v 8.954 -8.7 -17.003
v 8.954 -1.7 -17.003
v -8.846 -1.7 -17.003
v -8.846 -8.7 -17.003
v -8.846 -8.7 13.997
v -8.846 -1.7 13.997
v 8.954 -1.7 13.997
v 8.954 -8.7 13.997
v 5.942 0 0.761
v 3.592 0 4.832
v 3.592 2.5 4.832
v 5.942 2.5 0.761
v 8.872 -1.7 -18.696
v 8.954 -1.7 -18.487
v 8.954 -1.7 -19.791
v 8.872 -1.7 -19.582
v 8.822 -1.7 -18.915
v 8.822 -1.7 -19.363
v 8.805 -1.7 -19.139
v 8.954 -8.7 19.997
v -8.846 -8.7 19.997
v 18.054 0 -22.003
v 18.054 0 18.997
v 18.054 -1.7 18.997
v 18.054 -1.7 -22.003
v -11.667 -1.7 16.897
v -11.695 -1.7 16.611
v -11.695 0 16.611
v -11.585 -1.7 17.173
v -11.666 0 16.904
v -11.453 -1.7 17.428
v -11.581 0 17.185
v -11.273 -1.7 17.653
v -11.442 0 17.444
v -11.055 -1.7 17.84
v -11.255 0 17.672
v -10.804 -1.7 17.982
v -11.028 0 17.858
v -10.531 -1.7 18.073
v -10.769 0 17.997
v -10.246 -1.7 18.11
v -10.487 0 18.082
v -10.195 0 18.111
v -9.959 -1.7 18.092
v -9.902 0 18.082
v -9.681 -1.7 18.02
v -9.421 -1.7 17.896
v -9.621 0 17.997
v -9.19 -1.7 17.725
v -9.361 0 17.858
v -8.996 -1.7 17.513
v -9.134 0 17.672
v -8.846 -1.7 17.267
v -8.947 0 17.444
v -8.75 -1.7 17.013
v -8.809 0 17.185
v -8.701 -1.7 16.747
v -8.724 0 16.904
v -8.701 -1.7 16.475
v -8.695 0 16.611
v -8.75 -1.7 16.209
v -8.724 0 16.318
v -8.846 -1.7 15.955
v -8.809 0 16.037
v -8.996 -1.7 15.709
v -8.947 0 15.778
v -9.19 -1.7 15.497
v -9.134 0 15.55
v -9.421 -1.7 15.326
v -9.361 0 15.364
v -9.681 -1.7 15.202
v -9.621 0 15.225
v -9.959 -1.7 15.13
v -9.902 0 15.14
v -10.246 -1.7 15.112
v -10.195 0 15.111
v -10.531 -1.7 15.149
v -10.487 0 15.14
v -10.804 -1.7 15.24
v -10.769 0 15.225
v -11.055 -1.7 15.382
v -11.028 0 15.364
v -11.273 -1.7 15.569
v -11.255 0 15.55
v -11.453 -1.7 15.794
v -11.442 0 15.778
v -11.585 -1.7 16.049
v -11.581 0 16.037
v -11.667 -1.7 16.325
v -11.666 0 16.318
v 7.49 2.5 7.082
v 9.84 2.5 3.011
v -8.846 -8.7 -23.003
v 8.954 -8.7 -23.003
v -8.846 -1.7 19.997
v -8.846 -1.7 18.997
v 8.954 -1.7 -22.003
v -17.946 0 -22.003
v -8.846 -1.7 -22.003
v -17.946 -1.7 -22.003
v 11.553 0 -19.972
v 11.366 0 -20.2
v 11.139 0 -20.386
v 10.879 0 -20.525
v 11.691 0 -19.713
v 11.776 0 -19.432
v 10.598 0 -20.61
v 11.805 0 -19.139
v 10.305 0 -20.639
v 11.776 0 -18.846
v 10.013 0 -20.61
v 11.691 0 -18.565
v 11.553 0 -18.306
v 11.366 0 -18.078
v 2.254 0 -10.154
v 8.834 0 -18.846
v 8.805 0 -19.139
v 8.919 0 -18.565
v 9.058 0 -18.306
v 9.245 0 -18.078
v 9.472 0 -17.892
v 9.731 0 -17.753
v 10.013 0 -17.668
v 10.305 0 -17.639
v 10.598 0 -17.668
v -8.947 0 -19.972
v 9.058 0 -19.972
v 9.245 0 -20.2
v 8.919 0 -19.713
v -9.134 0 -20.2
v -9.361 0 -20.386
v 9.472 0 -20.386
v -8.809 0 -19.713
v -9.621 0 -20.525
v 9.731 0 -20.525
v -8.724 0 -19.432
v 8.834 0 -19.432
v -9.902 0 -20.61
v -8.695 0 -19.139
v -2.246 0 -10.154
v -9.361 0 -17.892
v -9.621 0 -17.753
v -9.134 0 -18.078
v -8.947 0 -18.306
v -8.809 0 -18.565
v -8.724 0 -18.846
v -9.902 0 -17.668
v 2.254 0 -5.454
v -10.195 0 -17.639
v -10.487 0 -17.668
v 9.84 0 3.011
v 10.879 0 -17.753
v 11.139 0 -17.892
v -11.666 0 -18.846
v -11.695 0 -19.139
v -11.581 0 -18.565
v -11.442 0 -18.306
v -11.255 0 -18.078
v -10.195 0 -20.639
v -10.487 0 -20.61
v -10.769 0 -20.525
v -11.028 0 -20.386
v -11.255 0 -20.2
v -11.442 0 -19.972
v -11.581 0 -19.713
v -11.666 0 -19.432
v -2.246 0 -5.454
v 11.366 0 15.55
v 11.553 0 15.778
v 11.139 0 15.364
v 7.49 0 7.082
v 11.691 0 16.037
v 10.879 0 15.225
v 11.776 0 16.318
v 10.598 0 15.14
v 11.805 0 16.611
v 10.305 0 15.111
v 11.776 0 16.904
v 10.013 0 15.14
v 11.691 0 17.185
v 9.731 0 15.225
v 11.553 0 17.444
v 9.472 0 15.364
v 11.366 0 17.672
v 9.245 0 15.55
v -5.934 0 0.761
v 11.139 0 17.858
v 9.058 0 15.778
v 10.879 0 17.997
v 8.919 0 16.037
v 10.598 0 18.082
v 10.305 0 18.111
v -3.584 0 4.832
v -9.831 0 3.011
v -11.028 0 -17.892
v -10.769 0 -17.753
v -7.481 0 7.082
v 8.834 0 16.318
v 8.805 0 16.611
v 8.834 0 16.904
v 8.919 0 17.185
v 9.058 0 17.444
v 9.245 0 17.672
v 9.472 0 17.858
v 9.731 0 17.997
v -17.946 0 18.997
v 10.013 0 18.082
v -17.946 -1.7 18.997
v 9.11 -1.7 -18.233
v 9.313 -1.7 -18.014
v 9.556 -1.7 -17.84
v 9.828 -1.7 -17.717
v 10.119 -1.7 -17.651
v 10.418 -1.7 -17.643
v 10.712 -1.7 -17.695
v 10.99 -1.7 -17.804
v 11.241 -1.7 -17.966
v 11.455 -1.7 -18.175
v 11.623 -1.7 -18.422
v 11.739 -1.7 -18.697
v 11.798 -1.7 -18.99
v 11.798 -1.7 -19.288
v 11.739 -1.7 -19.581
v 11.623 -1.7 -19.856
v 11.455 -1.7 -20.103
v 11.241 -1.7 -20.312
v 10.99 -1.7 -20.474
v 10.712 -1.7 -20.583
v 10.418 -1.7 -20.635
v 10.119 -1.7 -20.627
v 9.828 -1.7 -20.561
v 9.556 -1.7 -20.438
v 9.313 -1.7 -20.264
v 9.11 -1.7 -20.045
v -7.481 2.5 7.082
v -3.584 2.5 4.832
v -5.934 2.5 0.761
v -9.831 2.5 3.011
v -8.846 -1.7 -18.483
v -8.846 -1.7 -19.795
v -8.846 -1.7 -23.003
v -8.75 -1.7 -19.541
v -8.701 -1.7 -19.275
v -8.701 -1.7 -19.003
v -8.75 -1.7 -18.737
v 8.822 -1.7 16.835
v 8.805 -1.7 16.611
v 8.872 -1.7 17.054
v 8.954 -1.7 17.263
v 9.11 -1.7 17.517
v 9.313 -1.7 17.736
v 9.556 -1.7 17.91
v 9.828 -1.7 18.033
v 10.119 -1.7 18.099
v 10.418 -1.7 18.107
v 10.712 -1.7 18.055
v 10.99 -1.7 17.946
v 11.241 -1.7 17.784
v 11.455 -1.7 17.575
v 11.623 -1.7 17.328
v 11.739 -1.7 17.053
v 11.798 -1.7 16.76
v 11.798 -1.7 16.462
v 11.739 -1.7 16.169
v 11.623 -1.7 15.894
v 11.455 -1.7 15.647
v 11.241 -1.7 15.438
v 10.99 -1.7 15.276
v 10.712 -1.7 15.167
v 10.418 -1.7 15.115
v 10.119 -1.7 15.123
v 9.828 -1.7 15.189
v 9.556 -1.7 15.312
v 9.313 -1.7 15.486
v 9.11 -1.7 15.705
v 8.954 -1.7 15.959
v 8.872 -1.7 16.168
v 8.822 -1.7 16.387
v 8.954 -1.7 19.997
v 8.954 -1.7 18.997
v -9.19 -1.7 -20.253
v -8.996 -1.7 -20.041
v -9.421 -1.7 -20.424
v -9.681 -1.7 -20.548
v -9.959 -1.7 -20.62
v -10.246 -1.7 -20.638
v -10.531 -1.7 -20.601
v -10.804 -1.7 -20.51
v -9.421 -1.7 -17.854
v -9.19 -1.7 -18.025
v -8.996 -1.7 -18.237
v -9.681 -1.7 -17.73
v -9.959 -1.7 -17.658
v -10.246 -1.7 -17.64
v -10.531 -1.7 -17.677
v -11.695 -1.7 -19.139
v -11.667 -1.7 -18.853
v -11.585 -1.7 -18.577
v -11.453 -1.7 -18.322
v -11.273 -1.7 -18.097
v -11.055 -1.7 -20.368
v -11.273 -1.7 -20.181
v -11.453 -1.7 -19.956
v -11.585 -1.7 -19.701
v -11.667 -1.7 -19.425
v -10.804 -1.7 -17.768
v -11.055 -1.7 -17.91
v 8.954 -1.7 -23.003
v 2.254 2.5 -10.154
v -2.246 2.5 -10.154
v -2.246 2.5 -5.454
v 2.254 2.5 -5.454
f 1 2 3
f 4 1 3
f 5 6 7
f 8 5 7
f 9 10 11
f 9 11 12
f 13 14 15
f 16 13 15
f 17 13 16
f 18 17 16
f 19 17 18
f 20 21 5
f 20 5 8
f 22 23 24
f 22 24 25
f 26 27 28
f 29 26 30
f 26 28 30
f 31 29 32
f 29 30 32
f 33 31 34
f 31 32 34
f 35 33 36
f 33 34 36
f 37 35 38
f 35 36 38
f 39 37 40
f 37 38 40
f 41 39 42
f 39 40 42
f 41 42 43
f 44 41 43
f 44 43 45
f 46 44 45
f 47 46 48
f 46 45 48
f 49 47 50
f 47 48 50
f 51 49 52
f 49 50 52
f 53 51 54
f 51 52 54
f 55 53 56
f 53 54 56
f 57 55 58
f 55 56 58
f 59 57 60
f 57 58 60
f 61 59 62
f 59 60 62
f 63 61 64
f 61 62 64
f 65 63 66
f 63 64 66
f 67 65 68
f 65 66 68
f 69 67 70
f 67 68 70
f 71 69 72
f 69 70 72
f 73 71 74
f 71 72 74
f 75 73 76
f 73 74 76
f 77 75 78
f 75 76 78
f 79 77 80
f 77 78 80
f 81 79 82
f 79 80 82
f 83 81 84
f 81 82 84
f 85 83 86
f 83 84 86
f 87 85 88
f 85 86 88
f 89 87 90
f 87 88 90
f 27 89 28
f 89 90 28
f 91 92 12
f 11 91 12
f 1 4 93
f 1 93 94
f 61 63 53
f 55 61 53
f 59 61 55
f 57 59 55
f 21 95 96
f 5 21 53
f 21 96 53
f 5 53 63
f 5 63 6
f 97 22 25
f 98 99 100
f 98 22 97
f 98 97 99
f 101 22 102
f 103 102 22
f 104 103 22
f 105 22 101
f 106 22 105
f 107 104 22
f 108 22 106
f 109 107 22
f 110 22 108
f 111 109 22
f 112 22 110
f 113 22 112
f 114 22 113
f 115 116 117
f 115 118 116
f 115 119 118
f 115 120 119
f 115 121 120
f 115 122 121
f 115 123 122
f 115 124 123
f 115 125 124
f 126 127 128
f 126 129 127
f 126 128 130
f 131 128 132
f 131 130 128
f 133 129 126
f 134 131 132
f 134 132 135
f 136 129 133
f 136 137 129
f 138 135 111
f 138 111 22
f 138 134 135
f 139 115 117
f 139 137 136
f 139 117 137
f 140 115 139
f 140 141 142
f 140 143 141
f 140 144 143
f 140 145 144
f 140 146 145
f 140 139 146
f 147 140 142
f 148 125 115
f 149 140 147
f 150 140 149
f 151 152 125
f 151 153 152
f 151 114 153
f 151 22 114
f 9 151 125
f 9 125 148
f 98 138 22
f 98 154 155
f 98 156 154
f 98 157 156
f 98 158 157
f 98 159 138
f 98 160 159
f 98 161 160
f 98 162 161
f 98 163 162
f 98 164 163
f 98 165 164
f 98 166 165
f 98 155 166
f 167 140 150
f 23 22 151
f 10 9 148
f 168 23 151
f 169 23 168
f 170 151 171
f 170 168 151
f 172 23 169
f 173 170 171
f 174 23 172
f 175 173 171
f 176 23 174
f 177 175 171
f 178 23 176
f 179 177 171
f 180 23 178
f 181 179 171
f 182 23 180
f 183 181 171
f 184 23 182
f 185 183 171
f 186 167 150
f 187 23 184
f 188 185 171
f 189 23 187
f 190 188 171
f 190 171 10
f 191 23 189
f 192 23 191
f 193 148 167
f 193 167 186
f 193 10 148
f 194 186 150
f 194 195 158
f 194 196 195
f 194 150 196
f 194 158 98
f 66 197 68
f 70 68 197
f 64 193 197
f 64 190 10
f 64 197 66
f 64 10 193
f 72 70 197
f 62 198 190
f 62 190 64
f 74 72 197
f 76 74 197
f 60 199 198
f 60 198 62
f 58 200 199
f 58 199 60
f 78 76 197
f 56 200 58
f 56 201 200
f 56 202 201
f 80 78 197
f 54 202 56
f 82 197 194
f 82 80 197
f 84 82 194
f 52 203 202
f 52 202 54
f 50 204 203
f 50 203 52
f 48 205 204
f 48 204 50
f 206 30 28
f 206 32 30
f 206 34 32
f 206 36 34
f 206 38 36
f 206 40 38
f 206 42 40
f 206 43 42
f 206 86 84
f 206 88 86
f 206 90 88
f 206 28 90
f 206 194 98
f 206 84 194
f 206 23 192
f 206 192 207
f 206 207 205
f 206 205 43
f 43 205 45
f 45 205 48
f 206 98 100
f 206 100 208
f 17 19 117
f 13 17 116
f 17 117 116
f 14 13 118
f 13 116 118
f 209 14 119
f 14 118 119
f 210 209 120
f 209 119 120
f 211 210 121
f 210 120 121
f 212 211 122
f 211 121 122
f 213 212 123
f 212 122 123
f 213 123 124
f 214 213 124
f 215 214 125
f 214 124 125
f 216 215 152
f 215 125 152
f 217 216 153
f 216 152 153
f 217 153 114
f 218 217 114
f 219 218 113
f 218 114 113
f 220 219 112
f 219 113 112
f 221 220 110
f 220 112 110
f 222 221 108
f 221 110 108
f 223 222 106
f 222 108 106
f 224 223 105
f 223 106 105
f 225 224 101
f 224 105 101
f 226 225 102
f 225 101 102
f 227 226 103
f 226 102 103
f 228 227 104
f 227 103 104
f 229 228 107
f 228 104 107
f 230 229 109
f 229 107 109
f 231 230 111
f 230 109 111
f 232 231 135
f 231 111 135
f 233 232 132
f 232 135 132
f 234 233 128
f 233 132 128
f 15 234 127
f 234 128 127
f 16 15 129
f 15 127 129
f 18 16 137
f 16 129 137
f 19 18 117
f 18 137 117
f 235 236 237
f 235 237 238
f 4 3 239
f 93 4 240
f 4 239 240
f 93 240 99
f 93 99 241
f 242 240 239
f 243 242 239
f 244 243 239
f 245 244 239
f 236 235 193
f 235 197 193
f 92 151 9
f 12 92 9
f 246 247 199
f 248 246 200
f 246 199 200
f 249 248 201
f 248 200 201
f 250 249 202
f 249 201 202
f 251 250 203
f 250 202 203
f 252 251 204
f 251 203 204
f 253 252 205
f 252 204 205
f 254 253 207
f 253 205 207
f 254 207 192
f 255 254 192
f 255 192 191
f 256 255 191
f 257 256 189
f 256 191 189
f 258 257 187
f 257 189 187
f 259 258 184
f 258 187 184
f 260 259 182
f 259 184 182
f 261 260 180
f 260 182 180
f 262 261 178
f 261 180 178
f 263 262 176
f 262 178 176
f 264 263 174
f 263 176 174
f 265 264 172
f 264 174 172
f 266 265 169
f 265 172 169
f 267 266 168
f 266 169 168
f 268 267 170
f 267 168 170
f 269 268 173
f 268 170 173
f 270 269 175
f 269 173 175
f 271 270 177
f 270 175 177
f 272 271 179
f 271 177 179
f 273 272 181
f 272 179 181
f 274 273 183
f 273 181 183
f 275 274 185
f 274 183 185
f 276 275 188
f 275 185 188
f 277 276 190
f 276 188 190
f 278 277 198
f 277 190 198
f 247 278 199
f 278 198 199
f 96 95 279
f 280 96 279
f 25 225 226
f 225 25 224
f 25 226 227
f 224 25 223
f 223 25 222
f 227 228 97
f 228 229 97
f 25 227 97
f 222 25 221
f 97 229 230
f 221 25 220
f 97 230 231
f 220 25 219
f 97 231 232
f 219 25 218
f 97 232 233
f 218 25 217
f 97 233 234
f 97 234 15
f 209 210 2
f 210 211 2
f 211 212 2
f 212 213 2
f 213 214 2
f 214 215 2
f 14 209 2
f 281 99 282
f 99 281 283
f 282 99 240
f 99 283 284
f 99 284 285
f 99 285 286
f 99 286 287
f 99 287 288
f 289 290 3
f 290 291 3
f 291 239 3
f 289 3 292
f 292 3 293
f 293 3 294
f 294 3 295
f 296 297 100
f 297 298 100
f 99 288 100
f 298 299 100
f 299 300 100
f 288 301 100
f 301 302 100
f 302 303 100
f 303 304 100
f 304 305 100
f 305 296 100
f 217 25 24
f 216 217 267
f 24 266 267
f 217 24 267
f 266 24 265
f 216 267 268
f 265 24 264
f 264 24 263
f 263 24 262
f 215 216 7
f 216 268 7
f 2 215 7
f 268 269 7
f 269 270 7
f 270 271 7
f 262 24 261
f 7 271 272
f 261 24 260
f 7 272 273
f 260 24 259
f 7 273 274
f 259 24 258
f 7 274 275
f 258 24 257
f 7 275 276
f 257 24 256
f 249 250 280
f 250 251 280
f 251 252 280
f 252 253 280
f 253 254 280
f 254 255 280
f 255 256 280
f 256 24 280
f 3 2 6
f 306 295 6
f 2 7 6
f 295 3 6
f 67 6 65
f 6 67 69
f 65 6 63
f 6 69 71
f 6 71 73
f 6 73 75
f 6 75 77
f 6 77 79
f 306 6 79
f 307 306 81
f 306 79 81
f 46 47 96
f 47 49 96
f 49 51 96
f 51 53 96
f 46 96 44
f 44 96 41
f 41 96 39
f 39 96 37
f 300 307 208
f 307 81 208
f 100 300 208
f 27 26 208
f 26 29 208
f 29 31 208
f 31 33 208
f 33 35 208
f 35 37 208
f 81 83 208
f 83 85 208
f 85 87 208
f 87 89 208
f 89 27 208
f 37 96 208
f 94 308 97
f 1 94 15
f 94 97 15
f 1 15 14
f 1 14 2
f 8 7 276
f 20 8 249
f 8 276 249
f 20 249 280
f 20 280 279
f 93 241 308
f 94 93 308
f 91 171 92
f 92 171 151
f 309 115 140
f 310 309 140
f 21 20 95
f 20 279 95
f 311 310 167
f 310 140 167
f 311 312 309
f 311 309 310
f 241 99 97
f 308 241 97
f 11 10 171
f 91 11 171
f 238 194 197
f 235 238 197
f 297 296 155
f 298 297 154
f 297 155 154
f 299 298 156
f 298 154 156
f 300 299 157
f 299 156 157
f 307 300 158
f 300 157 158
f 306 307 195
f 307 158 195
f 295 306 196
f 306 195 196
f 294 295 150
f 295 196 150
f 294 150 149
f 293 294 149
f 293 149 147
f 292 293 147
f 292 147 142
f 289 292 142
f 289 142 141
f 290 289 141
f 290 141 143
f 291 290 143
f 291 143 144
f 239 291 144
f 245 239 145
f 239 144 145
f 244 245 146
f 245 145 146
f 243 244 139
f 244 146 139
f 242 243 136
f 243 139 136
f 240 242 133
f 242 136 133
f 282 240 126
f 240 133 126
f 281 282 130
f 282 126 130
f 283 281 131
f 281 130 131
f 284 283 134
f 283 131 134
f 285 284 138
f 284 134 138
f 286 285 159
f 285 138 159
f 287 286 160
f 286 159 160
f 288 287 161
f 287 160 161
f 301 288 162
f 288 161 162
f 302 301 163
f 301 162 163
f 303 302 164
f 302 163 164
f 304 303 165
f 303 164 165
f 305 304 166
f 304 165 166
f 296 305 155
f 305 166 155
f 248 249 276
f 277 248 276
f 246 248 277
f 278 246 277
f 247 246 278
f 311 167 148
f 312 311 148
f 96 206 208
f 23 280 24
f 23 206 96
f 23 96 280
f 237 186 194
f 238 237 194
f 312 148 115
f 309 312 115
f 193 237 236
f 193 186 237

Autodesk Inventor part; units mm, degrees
ref_plane "YZ Plane" through (0, 0, 0) normal (1, 0, 0) x (0, 1, 0)
ref_plane "XZ Plane" through (0, 0, 0) normal (0, 1, 0) x (-1, 0, 0)
ref_plane "XY Plane" through (0, 0, 0) normal (0, 0, 1) x (1, 0, 0)
sketch "Sketch1" plane through (0, 0, 0) normal (0, 1, 0) x (-1, 0, 0)
  line L0 (-18.0542, -22.0034) -> (17.9458, -22.0034)
  line L1 (17.9458, -22.0034) -> (17.9458, 18.9966)
  line L2 (17.9458, 18.9966) -> (-18.0542, 18.9966)
  line L3 (-18.0542, 18.9966) -> (-18.0542, -22.0034)
  line L4 (-18.0542, 18.9966) -> (-0.0043, 18.9966)
  line L5 (-18.0043, 0.0465) -> (-18.0542, 18.9966)
  circle A0 centre (0, 0) radius 11.5
  circle A1 centre (0, 0) radius 12.5
  line L6 (-2.2543, -5.4535) -> (-2.2543, -10.1535)
  line L7 (-2.2543, -10.1535) -> (2.2457, -10.1535)
  line L8 (2.2457, -10.1535) -> (2.2457, -5.4535)
  line L9 (2.2457, -5.4535) -> (-2.2543, -5.4535)
  line L10 (5.9338, 0.7614) -> (9.8309, 3.0114)
  line L11 (9.8309, 3.0114) -> (7.4809, 7.0817)
  line L12 (7.4809, 7.0817) -> (3.5838, 4.8317)
  line L13 (5.9338, 0.7614) -> (3.5838, 4.8317)
  line L14 (-3.5925, 4.8317) -> (-7.4896, 7.0817)
  line L15 (-7.4896, 7.0817) -> (-9.8396, 3.0114)
  line L16 (-9.8396, 3.0114) -> (-5.9425, 0.7614)
  line L17 (-3.5925, 4.8317) -> (-5.9425, 0.7614)
  circle A2 centre (10.1947, -19.139) radius 1.5
  circle A3 centre (-10.3053, 16.611) radius 1.5
  circle A4 centre (10.1947, 16.611) radius 1.5
  circle A5 centre (-10.3053, -19.139) radius 1.5
  line L18 (18.9458, -23.0034) -> (-19.0542, -23.0034)
  line L19 (-19.0542, -23.0034) -> (-19.0542, 19.9966)
  line L20 (-19.0542, 19.9966) -> (18.9458, 19.9966)
  line L21 (18.9458, 19.9966) -> (18.9458, -23.0034)
  line L22 (18.9458, -23.0034) -> (-18.9686, -22.7989) construction
  line L23 (-18.9686, -22.7989) -> (-18.7366, 20.211) construction
  line L24 (-18.7366, 20.211) -> (19.1777, 20.0065) construction
  line L25 (19.1777, 20.0065) -> (18.9458, -23.0034) construction
  point P0 (-0.0043, -1.4535)
  dimension "d0" = 41
  dimension "d1" = 36
  dimension "d2" = 4.7
  dimension "d3" = 4.5
  dimension "d4" = 4.5
  dimension "d5" = 4.7
  dimension "d6" = 3
  dimension "d7" = 3
  dimension "d8" = 3
  dimension "d9" = 3
  dimension "d10" = 1
extrude "Extrusion1" add sketch "Sketch1" against normal blind 1.7 contours L3 L2 L1 L0 | A0 | A1 | L9 L8 L7 L6 | L13 L12 L11 L10 | L17 L16 L15 L14
extrude "Extrusion2" add sketch "Sketch1" along normal blind 2.5 contours L9 L8 L7 L6 | L13 L12 L11 L10 | L17 L16 L15 L14
sketch "Sketch2" plane through (0, -1.7, 0) normal (0, -1, 0) x (1, 0, 0)
  line L0 (18.0542, 18.9966) -> (-17.9458, 18.9966) projected
  line L1 (8.9542, 19.9966) -> (-8.8458, 19.9966)
  line L2 (-8.8458, 19.9966) -> (-8.8458, 13.9966)
  line L3 (-8.8458, 13.9966) -> (8.9542, 13.9966)
  line L4 (8.9542, 13.9966) -> (8.9542, 19.9966)
  line L5 (18.0542, -22.0034) -> (-17.9458, -22.0034) projected
  line L6 (0.0542, -22.0034) -> (0.0542, -23.0034)
  line L7 (-8.8458, -23.0034) -> (8.9542, -23.0034)
  line L8 (8.9542, -23.0034) -> (8.9542, -17.0034)
  line L9 (8.9542, -17.0034) -> (-8.8458, -17.0034)
  line L10 (-8.8458, -17.0034) -> (-8.8458, -23.0034)
  point P0 (0, 0)
  dimension "d50" = 17.8
  dimension "d51" = 6
  dimension "d54" = 1
  dimension "d56" = 17.8
  dimension "d57" = 6
extrude "Extrusion3" add sketch "Sketch2" along normal blind 7
properties part number "Spectral_Sensor"
